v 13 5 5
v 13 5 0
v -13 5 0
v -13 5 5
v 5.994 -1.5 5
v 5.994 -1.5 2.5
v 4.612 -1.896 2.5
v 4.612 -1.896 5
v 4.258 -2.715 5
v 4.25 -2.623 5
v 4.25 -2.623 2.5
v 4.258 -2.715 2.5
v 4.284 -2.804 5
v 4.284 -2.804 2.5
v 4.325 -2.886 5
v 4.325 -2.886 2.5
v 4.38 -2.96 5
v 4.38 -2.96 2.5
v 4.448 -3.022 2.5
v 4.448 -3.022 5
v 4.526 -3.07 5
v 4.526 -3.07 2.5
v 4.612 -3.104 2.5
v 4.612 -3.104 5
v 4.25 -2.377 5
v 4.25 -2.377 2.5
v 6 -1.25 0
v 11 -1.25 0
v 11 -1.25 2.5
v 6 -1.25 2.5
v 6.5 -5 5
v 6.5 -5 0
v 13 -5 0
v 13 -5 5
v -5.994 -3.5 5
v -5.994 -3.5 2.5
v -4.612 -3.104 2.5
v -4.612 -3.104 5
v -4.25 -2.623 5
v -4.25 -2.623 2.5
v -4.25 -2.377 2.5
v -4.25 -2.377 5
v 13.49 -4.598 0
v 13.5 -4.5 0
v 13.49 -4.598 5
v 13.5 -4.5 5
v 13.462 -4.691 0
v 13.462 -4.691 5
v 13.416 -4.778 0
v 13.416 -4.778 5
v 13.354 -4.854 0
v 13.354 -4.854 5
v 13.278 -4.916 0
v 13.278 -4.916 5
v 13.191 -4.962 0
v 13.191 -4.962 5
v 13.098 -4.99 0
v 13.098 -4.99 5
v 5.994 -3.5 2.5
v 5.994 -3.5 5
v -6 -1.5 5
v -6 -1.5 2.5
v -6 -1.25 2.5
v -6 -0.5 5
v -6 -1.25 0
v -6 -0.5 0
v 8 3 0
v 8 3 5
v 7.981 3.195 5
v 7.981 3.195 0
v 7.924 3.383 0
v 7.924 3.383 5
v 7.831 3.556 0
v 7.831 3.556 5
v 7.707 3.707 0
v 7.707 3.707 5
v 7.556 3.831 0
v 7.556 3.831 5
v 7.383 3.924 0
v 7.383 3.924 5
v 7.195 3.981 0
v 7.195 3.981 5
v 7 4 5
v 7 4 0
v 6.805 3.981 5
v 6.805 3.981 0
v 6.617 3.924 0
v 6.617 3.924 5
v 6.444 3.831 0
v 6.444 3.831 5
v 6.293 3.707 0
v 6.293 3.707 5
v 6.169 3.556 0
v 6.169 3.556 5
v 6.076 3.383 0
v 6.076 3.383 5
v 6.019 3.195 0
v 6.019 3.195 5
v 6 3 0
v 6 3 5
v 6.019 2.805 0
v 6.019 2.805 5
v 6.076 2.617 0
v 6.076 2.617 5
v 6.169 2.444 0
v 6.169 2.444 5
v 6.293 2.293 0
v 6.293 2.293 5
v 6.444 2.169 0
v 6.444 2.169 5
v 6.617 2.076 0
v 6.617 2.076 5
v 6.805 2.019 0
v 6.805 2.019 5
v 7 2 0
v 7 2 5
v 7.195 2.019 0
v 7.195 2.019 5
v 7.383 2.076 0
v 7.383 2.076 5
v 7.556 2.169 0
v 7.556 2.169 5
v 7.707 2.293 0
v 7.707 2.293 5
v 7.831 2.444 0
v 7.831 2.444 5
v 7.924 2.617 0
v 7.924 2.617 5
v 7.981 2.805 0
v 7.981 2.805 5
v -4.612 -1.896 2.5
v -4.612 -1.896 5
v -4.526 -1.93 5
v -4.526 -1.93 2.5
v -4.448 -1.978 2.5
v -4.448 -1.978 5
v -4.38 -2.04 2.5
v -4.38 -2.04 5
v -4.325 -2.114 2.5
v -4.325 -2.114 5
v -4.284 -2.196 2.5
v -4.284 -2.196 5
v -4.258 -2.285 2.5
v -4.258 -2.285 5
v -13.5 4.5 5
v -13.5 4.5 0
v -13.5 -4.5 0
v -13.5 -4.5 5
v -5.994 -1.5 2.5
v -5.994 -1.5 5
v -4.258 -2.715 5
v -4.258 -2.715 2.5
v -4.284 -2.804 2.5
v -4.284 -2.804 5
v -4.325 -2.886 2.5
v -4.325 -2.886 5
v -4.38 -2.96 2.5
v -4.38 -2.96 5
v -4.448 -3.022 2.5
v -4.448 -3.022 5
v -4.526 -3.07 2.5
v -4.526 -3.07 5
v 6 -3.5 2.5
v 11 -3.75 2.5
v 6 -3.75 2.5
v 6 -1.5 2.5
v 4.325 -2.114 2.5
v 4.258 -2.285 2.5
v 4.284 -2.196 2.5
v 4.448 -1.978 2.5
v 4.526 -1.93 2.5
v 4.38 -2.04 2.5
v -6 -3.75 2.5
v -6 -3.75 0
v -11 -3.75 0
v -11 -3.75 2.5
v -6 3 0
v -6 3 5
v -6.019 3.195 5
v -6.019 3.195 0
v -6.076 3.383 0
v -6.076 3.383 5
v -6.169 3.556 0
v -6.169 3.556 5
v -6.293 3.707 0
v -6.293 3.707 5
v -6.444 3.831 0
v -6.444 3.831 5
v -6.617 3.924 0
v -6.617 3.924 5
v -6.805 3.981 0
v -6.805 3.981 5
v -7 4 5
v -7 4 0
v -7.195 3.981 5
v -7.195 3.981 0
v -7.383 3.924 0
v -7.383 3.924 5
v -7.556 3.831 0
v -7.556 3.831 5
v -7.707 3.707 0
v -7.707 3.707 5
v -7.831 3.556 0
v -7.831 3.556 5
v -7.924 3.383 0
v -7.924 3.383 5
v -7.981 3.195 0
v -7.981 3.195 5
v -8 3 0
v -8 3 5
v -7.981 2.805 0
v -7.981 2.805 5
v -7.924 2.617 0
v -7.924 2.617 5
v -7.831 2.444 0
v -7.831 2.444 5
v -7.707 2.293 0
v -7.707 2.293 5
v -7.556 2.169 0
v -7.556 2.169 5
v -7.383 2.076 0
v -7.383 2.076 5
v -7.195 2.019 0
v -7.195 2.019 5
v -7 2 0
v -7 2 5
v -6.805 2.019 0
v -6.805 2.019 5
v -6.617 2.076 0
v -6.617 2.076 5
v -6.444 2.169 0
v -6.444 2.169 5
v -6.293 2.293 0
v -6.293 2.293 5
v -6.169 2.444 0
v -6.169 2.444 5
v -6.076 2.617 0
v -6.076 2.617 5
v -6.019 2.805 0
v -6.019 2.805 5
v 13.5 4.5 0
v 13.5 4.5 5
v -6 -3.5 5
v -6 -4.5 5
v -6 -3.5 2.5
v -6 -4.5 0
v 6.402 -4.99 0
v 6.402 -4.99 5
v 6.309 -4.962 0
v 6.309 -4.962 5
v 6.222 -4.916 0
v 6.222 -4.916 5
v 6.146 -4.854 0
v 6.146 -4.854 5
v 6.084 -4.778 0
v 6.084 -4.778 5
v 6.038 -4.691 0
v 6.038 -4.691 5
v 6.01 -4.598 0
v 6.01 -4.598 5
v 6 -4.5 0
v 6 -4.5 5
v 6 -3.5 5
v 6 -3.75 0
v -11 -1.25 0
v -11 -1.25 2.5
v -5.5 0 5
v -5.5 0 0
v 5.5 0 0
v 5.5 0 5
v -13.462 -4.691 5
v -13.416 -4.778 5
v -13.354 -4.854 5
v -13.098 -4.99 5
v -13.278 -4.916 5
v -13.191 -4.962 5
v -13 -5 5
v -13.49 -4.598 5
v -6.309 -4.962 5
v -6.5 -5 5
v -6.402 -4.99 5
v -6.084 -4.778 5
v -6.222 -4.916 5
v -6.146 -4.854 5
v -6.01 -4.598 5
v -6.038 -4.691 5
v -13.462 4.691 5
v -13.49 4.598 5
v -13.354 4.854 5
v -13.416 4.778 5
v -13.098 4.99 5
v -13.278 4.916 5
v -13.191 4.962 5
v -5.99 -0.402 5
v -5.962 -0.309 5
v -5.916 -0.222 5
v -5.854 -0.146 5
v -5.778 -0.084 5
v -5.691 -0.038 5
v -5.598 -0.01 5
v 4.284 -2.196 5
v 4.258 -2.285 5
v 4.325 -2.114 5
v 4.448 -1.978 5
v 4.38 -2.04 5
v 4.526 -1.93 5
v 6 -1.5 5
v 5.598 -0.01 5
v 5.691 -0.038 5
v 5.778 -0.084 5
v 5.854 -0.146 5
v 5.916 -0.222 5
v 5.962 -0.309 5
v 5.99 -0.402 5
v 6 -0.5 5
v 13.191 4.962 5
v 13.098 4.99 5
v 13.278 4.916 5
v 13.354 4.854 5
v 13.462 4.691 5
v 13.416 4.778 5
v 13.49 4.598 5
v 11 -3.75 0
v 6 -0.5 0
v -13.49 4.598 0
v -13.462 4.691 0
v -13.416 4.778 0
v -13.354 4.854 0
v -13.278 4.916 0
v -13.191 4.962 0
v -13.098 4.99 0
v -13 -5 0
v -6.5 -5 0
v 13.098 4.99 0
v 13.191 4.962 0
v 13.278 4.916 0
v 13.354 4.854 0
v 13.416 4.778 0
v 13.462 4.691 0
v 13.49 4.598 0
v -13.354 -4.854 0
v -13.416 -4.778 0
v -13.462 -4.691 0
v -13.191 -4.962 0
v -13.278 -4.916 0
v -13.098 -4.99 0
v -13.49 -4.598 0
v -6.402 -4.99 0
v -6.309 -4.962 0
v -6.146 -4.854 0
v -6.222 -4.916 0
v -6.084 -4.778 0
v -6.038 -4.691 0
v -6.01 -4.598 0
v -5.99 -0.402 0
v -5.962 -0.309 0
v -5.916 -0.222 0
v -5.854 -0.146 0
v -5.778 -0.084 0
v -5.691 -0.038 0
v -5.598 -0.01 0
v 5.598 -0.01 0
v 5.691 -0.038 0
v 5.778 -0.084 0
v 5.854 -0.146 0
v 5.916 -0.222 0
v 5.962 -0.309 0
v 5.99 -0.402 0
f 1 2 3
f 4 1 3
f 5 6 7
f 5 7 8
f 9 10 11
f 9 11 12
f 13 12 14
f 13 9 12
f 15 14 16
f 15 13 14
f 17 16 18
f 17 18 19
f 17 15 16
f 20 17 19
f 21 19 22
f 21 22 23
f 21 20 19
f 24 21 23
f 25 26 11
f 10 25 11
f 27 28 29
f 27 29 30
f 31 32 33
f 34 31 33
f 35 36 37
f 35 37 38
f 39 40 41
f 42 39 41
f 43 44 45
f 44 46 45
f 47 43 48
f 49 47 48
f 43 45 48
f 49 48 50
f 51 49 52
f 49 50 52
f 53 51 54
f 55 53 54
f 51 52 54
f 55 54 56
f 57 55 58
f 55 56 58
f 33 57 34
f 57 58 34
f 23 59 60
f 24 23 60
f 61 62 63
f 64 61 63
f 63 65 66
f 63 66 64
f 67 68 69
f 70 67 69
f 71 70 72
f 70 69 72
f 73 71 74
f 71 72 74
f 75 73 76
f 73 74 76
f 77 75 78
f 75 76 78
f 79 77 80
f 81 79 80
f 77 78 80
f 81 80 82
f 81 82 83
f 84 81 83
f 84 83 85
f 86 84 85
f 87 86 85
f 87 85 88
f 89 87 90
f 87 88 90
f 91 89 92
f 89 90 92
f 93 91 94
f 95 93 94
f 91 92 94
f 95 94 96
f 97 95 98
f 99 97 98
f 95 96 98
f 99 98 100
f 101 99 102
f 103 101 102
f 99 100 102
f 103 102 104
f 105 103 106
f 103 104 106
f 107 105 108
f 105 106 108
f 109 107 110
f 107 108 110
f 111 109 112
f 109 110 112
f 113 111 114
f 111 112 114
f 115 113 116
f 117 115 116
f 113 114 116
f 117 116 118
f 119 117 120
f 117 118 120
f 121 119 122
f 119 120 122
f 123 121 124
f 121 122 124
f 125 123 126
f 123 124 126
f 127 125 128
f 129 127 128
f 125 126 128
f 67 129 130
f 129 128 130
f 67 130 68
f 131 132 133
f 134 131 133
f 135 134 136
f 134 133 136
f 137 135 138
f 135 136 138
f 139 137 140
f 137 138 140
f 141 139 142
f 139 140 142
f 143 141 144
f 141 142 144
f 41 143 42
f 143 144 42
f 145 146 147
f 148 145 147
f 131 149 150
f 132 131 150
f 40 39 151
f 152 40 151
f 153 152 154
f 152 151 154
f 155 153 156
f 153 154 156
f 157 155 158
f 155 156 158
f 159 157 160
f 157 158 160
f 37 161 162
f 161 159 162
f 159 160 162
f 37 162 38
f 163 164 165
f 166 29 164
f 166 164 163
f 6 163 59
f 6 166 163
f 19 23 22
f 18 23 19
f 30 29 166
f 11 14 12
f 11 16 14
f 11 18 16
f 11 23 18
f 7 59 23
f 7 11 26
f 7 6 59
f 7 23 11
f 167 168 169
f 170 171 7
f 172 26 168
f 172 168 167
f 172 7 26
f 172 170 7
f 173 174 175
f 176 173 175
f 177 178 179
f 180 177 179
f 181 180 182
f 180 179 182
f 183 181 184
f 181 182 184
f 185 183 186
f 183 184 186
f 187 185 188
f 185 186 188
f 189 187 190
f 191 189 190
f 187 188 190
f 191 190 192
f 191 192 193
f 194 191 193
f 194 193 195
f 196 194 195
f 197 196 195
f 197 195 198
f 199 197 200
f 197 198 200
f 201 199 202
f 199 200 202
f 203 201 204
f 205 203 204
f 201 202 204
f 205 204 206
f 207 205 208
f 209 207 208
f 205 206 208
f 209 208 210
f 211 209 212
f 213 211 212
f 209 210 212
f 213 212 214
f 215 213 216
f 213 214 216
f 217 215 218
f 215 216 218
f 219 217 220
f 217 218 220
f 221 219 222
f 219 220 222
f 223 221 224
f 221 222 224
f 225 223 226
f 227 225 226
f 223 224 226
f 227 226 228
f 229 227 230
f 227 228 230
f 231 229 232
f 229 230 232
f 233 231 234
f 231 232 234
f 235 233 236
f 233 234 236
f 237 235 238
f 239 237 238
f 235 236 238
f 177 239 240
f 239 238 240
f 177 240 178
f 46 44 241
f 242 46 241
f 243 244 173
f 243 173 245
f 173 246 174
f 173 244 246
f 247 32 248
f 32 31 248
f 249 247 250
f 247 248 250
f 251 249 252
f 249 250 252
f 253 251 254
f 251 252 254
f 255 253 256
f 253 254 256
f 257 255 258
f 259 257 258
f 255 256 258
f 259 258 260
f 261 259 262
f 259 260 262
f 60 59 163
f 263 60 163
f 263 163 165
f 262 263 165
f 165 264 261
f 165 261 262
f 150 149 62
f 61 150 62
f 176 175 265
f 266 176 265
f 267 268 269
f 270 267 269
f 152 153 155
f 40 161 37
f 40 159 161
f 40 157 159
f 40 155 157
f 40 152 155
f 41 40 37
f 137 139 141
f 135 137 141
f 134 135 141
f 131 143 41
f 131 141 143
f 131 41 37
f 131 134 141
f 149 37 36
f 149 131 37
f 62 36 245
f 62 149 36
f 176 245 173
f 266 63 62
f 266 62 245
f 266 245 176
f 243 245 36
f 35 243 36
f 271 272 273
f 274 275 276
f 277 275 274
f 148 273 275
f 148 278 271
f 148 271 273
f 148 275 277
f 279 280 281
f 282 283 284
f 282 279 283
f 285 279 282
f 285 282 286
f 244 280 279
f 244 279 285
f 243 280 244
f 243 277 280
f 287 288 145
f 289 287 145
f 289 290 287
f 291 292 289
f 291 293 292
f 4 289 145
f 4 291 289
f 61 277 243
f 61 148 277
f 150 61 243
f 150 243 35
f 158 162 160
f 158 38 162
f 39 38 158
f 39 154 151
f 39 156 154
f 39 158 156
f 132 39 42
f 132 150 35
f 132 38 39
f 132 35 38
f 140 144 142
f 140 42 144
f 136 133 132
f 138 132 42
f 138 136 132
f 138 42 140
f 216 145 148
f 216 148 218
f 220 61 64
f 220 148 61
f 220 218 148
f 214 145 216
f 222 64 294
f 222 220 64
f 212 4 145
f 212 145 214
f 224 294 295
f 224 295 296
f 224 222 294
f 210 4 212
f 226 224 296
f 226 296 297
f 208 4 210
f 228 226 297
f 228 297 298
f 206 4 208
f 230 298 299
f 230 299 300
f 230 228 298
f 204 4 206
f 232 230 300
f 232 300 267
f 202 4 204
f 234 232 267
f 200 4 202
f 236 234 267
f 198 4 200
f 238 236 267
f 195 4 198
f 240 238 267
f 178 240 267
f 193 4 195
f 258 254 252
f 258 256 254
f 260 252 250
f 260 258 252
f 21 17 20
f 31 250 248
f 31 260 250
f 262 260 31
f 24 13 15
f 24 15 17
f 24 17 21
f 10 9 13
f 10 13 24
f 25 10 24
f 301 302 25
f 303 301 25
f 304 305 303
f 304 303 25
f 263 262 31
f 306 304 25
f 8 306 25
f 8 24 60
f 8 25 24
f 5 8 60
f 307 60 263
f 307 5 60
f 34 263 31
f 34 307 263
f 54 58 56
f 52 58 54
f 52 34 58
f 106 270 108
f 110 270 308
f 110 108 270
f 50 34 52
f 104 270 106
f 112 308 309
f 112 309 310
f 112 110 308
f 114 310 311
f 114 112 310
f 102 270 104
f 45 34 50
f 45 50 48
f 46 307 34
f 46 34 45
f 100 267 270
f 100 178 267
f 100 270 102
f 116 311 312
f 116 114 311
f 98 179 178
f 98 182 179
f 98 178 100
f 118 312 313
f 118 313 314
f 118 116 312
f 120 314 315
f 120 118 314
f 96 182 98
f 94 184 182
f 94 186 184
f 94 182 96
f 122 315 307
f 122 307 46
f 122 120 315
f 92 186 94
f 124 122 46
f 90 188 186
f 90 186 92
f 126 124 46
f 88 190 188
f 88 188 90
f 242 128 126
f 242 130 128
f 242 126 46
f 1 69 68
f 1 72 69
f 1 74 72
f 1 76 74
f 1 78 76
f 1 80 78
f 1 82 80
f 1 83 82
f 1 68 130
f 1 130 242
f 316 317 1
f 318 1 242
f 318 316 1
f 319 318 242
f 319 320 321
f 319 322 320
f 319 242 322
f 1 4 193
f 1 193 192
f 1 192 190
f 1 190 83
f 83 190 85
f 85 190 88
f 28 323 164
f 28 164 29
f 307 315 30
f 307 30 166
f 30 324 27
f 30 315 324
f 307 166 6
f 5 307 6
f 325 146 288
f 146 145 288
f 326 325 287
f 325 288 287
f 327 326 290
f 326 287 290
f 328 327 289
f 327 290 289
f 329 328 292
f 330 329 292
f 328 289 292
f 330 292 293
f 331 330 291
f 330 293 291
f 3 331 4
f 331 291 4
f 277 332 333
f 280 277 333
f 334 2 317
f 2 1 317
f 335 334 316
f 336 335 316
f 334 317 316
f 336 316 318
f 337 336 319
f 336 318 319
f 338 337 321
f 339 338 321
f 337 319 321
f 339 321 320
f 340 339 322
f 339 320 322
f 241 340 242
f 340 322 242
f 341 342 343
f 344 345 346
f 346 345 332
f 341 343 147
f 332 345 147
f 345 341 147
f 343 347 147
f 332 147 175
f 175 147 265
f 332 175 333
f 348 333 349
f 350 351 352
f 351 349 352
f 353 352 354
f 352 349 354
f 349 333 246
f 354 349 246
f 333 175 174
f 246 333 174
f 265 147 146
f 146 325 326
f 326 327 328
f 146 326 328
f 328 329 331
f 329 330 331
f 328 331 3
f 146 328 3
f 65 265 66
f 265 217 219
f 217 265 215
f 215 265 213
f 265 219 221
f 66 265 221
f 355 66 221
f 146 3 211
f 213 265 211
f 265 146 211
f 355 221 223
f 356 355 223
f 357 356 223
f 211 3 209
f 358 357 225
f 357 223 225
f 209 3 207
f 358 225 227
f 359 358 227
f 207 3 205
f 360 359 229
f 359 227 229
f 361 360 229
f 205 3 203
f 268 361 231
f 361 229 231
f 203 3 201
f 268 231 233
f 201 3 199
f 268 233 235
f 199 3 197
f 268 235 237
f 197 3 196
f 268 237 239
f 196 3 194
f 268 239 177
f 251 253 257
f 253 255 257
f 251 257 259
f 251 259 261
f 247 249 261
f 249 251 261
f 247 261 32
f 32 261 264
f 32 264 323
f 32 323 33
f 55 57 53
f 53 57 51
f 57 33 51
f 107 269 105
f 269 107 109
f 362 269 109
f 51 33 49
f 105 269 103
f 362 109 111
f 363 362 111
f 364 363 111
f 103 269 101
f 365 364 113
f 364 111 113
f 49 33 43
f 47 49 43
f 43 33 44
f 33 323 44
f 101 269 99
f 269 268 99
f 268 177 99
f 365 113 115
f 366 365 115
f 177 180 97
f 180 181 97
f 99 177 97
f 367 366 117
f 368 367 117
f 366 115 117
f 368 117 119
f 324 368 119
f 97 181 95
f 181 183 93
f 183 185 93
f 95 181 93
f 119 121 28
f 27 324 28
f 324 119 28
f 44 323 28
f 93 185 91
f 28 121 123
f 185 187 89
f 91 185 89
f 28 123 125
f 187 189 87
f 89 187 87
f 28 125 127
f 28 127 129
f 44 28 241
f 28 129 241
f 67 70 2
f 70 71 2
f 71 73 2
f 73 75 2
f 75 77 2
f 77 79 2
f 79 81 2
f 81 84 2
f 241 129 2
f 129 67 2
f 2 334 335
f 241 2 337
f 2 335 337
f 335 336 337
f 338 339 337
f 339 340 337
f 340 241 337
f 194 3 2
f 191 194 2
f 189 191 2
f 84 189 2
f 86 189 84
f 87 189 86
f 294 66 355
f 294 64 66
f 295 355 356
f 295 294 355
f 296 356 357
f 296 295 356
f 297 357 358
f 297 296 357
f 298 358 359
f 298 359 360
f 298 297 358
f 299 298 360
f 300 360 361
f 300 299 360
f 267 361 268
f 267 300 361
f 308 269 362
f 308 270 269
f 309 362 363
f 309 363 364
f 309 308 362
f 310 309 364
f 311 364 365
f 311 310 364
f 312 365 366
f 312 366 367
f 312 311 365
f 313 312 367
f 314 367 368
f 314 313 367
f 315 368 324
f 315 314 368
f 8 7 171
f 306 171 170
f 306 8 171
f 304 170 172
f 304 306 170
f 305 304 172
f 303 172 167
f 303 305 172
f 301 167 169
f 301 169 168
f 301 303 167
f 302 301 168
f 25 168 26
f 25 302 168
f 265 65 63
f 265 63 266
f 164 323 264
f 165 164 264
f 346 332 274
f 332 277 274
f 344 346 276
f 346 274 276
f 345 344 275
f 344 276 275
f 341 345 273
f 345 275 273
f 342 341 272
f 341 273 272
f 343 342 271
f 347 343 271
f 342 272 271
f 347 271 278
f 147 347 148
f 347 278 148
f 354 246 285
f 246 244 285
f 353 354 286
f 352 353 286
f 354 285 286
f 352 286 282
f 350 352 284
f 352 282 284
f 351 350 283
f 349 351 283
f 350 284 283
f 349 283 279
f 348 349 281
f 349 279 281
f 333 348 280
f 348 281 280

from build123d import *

# Parameters (mm, degrees)
BOSS_EXTRUDE1_DEPTH   = 5
CHAMFER1_SIZE         = 0.5
CHAMFER1_SIZE2        = 1.743707222
CHAMFER1_PART_2_SIZE  = 0.5
CHAMFER1_PART_2_SIZE2 = 1.743707222
FILLET1_R             = 0.5
SKETCH2_R             = 1
CUT_EXTRUDE1_DEPTH    = 5
FILLET2_R             = 0.5
SKETCH4_W             = 6.75
SKETCH4_H             = 2.5
CUT_EXTRUDE2_DEPTH    = 2.5


with BuildPart() as part:
    # Sketch1 → Boss-Extrude1 (new body)
    with BuildSketch(Plane.XY):
        Polygon((-6, -1.5), (-6, 0), (6, 0), (6, -1.5), (4.25, -1.5), (4.25, -3.5), (6, -3.5), (6, -5), (13.5, -5), (13.5, 5), (-13.5, 5), (-13.5, -5), (-6, -5), (-6, -3.5), (-4.25, -3.5), (-4.25, -1.5), align=None)
    extrude(amount=BOSS_EXTRUDE1_DEPTH)

    # Chamfer1
    chamfer1_edges = [part.edges().sort_by_distance(p)[0] for p in [
        (4.25, -3.5, 2.5),
        (4.25, -1.5, 2.5),
    ]]
    chamfer1_side = [part.faces().sort_by_distance(p)[0] for p in [
        (4.25, -2.5, 2.5),
    ]]
    chamfer(chamfer1_edges, length=CHAMFER1_SIZE, length2=CHAMFER1_SIZE2, reference=chamfer1_side[0])

    # Chamfer1 part 2
    chamfer1_part_2_edges = [part.edges().sort_by_distance(p)[0] for p in [
        (-4.25, -1.5, 2.5),
        (-4.25, -3.5, 2.5),
    ]]
    chamfer1_part_2_side = [part.faces().sort_by_distance(p)[0] for p in [
        (-4.25, -2.5, 2.5),
    ]]
    chamfer(chamfer1_part_2_edges, length=CHAMFER1_PART_2_SIZE, length2=CHAMFER1_PART_2_SIZE2, reference=chamfer1_part_2_side[0])

    # Fillet1
    fillet1_edges = [part.edges().sort_by_distance(p)[0] for p in [
        (4.25, -2, 2.5),
        (4.25, -3, 2.5),
        (-4.25, -2, 2.5),
        (-4.25, -3, 2.5),
    ]]
    fillet(fillet1_edges, radius=FILLET1_R)

    # Sketch2 → Cut-Extrude1 (cut)
    with BuildSketch(Plane.XY.offset(5)):
        with Locations((-7, 3)):
            Circle(SKETCH2_R)
        with Locations((7, 3)):
            Circle(SKETCH2_R)
    extrude(amount=-CUT_EXTRUDE1_DEPTH, mode=Mode.SUBTRACT)

    # Fillet2
    fillet2_edges = [part.edges().sort_by_distance(p)[0] for p in [
        (6, -5, 2.5),
        (6, 0, 2.5),
        (-6, 0, 2.5),
        (-6, -5, 2.5),
        (-13.5, -5, 2.5),
        (-13.5, 5, 2.5),
        (13.5, 5, 2.5),
        (13.5, -5, 2.5),
    ]]
    fillet(fillet2_edges, radius=FILLET2_R)

    # Sketch4 → Cut-Extrude2 (cut)
    with BuildSketch(Plane(origin=(0, 0, 0), x_dir=(-1, 0, 0), z_dir=(0, 0, -1))):
        with Locations((-7.625, -2.5)):
            Rectangle(SKETCH4_W, SKETCH4_H)
        with Locations((7.625, -2.5)):
            Rectangle(SKETCH4_W, SKETCH4_H)
    extrude(amount=-CUT_EXTRUDE2_DEPTH, mode=Mode.SUBTRACT)


solid = part.part
